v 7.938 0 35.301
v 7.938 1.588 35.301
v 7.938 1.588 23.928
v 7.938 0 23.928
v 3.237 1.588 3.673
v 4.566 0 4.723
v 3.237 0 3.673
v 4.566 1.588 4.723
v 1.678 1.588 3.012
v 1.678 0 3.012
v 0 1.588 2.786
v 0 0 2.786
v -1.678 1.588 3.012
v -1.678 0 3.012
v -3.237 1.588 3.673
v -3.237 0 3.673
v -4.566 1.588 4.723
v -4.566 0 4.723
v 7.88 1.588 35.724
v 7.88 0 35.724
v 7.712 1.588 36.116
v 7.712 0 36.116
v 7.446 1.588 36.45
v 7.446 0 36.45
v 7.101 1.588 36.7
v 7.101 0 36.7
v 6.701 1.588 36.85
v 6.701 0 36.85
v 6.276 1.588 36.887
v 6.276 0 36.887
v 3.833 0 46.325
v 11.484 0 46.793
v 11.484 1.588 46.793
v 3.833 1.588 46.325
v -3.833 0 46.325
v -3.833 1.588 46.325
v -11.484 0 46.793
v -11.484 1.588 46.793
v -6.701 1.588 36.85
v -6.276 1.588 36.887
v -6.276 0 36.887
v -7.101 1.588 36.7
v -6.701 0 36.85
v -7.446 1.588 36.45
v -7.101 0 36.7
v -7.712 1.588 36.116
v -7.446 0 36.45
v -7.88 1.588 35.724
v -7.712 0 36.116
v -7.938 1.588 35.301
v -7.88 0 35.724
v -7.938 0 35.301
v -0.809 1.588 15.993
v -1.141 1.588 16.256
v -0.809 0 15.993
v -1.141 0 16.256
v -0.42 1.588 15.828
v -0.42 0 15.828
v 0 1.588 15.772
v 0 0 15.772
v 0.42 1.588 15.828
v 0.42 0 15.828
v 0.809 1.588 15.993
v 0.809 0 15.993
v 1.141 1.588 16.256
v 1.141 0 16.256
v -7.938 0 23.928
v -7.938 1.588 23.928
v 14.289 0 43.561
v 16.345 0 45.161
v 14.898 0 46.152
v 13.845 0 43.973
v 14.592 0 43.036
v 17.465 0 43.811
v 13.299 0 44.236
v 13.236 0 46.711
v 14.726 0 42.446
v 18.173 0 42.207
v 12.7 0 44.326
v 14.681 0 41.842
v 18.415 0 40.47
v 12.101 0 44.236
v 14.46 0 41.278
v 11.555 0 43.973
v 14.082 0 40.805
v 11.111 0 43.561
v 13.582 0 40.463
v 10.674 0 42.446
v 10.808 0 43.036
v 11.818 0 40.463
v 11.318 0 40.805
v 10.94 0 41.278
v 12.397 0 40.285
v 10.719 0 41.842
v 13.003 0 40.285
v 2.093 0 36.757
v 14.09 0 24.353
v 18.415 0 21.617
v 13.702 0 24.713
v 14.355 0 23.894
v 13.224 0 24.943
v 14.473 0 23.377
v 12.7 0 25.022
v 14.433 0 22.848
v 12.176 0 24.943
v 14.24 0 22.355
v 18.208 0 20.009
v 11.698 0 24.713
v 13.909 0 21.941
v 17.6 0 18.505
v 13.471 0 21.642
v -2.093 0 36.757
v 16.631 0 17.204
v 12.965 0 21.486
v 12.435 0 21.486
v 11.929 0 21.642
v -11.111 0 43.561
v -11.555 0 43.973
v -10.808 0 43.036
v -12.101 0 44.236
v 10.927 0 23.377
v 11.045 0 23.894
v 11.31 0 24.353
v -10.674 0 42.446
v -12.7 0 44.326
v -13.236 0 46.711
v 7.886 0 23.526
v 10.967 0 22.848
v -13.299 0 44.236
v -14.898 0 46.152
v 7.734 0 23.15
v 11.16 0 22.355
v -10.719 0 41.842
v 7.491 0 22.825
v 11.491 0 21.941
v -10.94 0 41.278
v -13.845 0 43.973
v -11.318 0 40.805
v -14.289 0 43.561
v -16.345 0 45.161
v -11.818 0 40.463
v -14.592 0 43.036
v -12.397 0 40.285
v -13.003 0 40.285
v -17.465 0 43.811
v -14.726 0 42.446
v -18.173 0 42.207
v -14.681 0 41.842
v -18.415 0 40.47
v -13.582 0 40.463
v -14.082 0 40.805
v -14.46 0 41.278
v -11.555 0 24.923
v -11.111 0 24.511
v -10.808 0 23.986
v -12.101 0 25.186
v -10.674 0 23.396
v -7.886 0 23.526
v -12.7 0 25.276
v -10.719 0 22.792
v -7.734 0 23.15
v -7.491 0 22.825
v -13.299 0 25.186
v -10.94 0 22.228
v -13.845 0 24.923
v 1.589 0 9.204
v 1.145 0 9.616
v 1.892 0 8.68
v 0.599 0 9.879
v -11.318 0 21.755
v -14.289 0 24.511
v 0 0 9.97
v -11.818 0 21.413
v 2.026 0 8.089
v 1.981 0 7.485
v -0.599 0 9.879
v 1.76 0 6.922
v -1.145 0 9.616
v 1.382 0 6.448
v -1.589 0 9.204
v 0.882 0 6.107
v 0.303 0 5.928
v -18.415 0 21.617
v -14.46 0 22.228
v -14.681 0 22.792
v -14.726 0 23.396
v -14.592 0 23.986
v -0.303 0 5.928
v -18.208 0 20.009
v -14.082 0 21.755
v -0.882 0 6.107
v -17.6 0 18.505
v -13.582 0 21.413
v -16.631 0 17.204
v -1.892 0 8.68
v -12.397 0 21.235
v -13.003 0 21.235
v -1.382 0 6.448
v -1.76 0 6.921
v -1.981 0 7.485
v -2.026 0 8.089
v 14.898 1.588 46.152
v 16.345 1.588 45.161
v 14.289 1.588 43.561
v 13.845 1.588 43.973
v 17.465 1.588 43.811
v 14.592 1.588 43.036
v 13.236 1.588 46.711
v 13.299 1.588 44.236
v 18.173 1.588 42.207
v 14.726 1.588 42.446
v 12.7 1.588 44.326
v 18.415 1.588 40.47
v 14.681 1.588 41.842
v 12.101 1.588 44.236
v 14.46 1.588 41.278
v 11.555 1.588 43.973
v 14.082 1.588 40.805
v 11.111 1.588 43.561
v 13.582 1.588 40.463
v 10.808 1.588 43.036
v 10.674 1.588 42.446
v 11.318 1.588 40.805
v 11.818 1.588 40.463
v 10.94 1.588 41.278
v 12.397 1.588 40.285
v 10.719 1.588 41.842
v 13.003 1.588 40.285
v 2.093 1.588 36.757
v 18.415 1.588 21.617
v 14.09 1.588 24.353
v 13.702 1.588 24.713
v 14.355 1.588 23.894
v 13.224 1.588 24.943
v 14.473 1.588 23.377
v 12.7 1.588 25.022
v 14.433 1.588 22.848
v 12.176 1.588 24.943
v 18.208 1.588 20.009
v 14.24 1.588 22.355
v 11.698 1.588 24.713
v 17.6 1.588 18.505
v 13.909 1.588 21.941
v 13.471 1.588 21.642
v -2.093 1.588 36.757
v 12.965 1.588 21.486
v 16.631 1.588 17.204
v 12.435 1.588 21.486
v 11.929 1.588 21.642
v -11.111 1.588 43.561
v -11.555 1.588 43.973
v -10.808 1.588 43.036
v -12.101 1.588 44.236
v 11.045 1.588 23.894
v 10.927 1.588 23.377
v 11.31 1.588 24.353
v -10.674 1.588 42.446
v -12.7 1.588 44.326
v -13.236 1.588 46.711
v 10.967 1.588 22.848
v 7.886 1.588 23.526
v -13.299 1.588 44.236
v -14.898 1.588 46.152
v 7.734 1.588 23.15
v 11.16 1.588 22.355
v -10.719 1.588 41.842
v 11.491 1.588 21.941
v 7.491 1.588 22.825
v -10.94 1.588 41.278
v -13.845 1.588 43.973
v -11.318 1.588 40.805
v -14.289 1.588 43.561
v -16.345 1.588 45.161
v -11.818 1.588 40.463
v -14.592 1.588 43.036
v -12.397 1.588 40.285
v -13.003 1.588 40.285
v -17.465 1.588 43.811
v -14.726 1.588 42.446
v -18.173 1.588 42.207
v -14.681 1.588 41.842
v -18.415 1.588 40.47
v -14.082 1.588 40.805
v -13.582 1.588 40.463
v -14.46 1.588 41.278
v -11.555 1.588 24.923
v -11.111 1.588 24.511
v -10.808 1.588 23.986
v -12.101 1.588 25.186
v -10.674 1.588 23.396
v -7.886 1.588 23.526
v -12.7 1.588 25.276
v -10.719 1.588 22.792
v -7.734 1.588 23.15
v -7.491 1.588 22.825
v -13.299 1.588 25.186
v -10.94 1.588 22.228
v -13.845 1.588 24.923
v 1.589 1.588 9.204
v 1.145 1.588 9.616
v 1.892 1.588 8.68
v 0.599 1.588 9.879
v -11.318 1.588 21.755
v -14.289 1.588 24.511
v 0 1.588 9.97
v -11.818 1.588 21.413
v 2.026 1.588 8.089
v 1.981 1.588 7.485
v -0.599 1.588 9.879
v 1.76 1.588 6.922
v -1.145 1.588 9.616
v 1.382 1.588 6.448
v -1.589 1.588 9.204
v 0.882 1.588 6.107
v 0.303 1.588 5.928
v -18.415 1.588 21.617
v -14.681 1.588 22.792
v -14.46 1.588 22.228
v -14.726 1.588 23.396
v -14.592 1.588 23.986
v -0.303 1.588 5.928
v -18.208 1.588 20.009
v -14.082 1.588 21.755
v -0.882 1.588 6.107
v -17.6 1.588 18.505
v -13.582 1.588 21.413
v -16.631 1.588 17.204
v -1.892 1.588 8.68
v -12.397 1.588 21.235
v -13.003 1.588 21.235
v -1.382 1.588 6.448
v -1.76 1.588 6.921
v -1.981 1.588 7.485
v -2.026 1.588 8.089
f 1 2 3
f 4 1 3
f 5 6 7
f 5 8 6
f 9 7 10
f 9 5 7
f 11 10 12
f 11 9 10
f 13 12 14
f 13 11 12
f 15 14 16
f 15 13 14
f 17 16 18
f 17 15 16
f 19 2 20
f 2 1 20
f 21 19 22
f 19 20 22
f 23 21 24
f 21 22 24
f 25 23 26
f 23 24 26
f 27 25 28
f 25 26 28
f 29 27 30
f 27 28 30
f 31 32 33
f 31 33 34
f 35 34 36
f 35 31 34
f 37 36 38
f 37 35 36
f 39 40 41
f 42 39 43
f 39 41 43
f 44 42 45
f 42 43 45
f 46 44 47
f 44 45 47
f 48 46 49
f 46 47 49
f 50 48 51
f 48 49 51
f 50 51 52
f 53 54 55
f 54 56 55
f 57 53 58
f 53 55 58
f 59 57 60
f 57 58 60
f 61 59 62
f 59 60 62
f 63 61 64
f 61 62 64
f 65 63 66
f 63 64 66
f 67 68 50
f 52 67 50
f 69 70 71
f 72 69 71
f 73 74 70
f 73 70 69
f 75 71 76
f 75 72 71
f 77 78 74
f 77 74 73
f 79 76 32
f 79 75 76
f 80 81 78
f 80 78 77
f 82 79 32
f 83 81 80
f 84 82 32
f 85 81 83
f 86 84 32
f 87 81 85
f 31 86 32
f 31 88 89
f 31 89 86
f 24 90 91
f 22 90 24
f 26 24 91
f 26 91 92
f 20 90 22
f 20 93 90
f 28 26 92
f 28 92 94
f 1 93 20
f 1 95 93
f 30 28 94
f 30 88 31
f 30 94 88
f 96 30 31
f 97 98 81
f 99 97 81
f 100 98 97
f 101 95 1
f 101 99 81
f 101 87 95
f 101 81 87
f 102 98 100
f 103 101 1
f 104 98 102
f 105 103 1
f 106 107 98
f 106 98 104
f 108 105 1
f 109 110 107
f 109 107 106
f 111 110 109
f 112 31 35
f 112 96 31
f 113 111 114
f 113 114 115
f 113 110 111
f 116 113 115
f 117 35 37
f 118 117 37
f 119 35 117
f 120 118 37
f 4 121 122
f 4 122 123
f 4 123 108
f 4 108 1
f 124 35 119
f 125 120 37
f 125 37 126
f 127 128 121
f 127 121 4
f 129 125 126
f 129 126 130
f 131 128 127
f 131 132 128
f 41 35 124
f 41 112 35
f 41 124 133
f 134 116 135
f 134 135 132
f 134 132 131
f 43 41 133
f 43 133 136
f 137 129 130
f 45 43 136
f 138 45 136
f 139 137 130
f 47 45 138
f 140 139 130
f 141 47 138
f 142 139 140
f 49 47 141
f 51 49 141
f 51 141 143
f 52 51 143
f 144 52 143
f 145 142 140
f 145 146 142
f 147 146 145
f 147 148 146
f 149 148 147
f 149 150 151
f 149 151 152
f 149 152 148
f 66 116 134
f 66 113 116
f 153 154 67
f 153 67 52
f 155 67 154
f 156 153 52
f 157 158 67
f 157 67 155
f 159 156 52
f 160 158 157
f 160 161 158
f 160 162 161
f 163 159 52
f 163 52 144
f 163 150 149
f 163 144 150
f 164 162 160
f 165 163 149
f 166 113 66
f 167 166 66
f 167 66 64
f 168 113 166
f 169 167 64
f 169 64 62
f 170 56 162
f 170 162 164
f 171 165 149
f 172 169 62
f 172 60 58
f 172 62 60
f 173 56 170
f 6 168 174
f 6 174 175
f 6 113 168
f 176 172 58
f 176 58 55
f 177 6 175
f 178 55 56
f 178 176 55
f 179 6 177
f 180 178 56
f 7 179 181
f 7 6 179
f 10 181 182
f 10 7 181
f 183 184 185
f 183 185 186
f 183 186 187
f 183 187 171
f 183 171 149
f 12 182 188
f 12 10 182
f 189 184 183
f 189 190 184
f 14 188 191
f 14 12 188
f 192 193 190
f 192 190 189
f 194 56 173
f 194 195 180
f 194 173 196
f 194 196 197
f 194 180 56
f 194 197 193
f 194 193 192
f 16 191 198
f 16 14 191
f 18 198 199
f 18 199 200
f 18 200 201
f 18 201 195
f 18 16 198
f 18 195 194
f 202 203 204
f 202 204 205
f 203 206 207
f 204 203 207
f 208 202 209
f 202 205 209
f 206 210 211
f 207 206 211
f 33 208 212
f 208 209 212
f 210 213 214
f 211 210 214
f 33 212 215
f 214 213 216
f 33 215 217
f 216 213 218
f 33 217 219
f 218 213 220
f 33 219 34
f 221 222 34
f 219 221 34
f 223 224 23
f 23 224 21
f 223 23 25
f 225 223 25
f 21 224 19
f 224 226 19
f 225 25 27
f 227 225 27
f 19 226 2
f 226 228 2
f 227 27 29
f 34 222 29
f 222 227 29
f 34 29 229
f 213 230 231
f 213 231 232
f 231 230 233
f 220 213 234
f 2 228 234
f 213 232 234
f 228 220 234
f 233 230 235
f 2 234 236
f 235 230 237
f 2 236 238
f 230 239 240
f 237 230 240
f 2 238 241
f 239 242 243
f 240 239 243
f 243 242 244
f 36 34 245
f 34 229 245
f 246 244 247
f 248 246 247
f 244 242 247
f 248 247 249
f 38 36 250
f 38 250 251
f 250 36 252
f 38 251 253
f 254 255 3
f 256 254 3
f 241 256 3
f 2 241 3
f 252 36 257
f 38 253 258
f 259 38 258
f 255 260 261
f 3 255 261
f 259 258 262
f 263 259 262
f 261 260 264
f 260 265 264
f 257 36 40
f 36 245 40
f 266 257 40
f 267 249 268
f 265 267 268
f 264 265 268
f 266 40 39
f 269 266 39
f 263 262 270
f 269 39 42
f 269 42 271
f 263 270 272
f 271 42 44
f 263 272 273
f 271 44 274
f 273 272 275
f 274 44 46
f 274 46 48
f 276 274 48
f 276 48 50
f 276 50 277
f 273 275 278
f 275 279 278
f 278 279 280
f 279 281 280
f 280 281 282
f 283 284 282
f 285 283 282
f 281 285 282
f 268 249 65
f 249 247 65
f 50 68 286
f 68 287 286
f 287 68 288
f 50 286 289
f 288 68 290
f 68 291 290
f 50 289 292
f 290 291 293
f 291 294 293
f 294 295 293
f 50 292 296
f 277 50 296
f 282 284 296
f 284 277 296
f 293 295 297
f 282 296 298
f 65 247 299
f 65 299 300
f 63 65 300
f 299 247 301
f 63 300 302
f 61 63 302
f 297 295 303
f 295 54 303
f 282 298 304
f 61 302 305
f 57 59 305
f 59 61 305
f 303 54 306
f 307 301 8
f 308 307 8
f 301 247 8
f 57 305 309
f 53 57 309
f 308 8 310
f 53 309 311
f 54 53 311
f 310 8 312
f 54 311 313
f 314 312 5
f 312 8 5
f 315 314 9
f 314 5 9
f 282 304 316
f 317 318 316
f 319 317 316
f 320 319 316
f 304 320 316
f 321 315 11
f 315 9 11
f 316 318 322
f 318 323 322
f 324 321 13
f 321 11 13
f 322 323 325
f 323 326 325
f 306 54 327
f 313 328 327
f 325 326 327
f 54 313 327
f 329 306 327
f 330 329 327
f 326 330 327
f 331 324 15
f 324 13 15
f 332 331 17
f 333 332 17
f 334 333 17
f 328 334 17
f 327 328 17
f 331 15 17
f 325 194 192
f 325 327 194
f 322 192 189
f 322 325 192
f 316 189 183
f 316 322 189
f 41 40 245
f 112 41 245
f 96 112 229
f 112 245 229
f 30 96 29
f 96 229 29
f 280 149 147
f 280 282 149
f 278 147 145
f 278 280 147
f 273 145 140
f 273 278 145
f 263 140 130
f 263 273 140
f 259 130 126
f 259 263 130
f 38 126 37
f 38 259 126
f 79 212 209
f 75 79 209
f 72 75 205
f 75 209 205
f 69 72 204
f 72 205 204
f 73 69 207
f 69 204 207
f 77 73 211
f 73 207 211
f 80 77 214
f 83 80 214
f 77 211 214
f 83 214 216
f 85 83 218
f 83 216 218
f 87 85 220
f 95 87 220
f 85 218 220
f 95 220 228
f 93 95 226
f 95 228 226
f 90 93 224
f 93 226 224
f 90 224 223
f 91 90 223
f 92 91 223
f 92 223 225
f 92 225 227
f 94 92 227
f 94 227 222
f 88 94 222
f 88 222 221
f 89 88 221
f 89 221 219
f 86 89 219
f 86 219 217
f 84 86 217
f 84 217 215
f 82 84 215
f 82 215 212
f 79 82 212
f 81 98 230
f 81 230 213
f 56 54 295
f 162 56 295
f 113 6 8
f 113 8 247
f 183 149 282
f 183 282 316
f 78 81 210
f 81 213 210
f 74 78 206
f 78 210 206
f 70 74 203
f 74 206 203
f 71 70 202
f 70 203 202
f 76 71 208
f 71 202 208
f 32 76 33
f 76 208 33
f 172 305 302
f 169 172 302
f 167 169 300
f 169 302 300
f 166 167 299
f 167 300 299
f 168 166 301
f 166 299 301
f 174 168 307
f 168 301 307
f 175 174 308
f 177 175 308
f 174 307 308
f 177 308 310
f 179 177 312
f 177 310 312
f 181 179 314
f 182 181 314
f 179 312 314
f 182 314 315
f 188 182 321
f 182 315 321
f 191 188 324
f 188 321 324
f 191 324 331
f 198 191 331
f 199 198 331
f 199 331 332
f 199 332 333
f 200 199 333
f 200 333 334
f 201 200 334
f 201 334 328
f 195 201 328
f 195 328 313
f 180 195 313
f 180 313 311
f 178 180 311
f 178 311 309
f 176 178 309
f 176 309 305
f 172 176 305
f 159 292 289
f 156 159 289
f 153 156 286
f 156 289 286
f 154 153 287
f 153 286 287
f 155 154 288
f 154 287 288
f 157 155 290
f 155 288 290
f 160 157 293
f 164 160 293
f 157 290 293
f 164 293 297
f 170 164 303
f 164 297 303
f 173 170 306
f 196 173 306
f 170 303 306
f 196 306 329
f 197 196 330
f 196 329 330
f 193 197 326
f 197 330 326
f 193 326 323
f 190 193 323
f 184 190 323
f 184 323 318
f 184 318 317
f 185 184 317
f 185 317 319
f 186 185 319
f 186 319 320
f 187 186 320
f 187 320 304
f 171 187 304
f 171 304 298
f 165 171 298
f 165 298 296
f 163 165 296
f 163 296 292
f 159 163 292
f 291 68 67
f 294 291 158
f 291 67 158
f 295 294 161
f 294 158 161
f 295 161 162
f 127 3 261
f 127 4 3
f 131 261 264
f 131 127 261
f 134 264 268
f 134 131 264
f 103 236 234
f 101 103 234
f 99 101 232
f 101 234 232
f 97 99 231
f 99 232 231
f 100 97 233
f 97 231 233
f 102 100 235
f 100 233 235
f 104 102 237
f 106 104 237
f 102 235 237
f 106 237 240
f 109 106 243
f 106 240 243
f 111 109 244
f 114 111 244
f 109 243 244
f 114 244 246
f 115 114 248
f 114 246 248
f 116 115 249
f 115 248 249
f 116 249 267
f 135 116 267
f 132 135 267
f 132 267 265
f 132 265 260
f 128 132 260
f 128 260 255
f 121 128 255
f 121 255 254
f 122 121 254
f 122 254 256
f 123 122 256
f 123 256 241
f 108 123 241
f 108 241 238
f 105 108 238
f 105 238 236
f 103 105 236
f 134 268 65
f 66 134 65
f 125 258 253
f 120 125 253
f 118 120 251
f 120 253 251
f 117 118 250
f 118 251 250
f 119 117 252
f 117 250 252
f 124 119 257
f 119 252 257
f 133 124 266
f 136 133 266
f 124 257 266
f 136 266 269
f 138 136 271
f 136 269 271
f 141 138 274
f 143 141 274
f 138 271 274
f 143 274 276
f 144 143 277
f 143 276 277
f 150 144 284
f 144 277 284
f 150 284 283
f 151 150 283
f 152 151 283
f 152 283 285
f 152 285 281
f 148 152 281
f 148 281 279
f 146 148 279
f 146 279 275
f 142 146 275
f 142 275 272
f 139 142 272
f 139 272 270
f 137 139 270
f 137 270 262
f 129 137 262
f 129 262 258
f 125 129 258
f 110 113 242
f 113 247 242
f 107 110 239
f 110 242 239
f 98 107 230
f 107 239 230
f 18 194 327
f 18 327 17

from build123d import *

# Parameters (mm, degrees)
BOSS_EXTRUDE1_DEPTH = 1.5875
SKETCH3_R           = 2.032
SKETCH3_R_2         = 1.778
CUT_EXTRUDE1_DEPTH  = 52.085937461
CUT_EXTRUDE2_DEPTH  = 52.085937461
FILLET1_R           = 6.35
FILLET2_R           = 1.5875


with BuildPart() as part:
    # Sketch1 → Boss-Extrude1 (new body)
    with BuildSketch(Plane(origin=(0, 0, 0), x_dir=(1, 0, 0), z_dir=(0, 1, 0))):
        with BuildLine():
            Line((0, 0), (18.415, -19.05))
            Line((18.415, -19.05), (18.415, -47.625))
            ThreePointArc((18.415, -47.625), (0, -46.266231115), (-18.415, -47.625))
            Line((-18.415, -47.625), (-18.415, -19.05))
            Line((-18.415, -19.05), (0, 0))
        make_face()
    extrude(amount=BOSS_EXTRUDE1_DEPTH)

    # Sketch3 → Cut-Extrude1 (cut, through all)
    with BuildSketch(Plane(origin=(0, 1.5875, 0), x_dir=(1, 0, 0), z_dir=(0, 1, 0))):
        with Locations(Location((12.7, -42.294109534, 0), (0, 0, 270))):
            Circle(SKETCH3_R)
        with Locations(Location((-12.7, -42.294109534, 0), (0, 0, 270))):
            Circle(SKETCH3_R)
        with Locations(Location((-12.7, -23.244109534, 0), (0, 0, 270))):
            Circle(SKETCH3_R)
        with Locations(Location((12.7, -23.244109534, 0), (0, 0, 270))):
            Circle(SKETCH3_R_2)
        with Locations(Location((0, -7.9375, 0), (0, 0, 270))):
            Circle(SKETCH3_R)
    extrude(amount=-CUT_EXTRUDE1_DEPTH, mode=Mode.SUBTRACT)

    # Sketch4 → Cut-Extrude2 (cut, through all)
    with BuildSketch(Plane(origin=(0, 1.5875, 0), x_dir=(1, 0, 0), z_dir=(0, 1, 0))):
        with BuildLine():
            Line((7.9375, -36.974796609), (7.9375, -23.286267168))
            Line((7.9375, -23.286267168), (0, -15.075060272))
            Line((0, -15.075060272), (-7.9375, -23.286267168))
            Line((-7.9375, -23.286267168), (-7.9375, -36.974796609))
            ThreePointArc((-7.9375, -36.974796609), (0, -36.741231115), (7.9375, -36.974796609))
        make_face()
    extrude(amount=-CUT_EXTRUDE2_DEPTH, mode=Mode.SUBTRACT)

    # Fillet1
    fillet1_edges = [part.edges().sort_by_distance(p)[0] for p in [
        (0, 0.79375, 0),
        (18.415, 0.79375, 19.05),
        (18.415, 0.79375, 47.625),
        (-18.415, 0.79375, 47.625),
        (-18.415, 0.79375, 19.05),
    ]]
    fillet(fillet1_edges, radius=FILLET1_R)

    # Fillet2
    fillet2_edges = [part.edges().sort_by_distance(p)[0] for p in [
        (-7.9375, 0.79375, 23.286267168),
        (0, 0.79375, 15.075060272),
        (7.9375, 0.79375, 23.286267168),
        (7.9375, 0.79375, 36.974796609),
        (-7.9375, 0.79375, 36.974796609),
    ]]
    fillet(fillet2_edges, radius=FILLET2_R)


solid = part.part
